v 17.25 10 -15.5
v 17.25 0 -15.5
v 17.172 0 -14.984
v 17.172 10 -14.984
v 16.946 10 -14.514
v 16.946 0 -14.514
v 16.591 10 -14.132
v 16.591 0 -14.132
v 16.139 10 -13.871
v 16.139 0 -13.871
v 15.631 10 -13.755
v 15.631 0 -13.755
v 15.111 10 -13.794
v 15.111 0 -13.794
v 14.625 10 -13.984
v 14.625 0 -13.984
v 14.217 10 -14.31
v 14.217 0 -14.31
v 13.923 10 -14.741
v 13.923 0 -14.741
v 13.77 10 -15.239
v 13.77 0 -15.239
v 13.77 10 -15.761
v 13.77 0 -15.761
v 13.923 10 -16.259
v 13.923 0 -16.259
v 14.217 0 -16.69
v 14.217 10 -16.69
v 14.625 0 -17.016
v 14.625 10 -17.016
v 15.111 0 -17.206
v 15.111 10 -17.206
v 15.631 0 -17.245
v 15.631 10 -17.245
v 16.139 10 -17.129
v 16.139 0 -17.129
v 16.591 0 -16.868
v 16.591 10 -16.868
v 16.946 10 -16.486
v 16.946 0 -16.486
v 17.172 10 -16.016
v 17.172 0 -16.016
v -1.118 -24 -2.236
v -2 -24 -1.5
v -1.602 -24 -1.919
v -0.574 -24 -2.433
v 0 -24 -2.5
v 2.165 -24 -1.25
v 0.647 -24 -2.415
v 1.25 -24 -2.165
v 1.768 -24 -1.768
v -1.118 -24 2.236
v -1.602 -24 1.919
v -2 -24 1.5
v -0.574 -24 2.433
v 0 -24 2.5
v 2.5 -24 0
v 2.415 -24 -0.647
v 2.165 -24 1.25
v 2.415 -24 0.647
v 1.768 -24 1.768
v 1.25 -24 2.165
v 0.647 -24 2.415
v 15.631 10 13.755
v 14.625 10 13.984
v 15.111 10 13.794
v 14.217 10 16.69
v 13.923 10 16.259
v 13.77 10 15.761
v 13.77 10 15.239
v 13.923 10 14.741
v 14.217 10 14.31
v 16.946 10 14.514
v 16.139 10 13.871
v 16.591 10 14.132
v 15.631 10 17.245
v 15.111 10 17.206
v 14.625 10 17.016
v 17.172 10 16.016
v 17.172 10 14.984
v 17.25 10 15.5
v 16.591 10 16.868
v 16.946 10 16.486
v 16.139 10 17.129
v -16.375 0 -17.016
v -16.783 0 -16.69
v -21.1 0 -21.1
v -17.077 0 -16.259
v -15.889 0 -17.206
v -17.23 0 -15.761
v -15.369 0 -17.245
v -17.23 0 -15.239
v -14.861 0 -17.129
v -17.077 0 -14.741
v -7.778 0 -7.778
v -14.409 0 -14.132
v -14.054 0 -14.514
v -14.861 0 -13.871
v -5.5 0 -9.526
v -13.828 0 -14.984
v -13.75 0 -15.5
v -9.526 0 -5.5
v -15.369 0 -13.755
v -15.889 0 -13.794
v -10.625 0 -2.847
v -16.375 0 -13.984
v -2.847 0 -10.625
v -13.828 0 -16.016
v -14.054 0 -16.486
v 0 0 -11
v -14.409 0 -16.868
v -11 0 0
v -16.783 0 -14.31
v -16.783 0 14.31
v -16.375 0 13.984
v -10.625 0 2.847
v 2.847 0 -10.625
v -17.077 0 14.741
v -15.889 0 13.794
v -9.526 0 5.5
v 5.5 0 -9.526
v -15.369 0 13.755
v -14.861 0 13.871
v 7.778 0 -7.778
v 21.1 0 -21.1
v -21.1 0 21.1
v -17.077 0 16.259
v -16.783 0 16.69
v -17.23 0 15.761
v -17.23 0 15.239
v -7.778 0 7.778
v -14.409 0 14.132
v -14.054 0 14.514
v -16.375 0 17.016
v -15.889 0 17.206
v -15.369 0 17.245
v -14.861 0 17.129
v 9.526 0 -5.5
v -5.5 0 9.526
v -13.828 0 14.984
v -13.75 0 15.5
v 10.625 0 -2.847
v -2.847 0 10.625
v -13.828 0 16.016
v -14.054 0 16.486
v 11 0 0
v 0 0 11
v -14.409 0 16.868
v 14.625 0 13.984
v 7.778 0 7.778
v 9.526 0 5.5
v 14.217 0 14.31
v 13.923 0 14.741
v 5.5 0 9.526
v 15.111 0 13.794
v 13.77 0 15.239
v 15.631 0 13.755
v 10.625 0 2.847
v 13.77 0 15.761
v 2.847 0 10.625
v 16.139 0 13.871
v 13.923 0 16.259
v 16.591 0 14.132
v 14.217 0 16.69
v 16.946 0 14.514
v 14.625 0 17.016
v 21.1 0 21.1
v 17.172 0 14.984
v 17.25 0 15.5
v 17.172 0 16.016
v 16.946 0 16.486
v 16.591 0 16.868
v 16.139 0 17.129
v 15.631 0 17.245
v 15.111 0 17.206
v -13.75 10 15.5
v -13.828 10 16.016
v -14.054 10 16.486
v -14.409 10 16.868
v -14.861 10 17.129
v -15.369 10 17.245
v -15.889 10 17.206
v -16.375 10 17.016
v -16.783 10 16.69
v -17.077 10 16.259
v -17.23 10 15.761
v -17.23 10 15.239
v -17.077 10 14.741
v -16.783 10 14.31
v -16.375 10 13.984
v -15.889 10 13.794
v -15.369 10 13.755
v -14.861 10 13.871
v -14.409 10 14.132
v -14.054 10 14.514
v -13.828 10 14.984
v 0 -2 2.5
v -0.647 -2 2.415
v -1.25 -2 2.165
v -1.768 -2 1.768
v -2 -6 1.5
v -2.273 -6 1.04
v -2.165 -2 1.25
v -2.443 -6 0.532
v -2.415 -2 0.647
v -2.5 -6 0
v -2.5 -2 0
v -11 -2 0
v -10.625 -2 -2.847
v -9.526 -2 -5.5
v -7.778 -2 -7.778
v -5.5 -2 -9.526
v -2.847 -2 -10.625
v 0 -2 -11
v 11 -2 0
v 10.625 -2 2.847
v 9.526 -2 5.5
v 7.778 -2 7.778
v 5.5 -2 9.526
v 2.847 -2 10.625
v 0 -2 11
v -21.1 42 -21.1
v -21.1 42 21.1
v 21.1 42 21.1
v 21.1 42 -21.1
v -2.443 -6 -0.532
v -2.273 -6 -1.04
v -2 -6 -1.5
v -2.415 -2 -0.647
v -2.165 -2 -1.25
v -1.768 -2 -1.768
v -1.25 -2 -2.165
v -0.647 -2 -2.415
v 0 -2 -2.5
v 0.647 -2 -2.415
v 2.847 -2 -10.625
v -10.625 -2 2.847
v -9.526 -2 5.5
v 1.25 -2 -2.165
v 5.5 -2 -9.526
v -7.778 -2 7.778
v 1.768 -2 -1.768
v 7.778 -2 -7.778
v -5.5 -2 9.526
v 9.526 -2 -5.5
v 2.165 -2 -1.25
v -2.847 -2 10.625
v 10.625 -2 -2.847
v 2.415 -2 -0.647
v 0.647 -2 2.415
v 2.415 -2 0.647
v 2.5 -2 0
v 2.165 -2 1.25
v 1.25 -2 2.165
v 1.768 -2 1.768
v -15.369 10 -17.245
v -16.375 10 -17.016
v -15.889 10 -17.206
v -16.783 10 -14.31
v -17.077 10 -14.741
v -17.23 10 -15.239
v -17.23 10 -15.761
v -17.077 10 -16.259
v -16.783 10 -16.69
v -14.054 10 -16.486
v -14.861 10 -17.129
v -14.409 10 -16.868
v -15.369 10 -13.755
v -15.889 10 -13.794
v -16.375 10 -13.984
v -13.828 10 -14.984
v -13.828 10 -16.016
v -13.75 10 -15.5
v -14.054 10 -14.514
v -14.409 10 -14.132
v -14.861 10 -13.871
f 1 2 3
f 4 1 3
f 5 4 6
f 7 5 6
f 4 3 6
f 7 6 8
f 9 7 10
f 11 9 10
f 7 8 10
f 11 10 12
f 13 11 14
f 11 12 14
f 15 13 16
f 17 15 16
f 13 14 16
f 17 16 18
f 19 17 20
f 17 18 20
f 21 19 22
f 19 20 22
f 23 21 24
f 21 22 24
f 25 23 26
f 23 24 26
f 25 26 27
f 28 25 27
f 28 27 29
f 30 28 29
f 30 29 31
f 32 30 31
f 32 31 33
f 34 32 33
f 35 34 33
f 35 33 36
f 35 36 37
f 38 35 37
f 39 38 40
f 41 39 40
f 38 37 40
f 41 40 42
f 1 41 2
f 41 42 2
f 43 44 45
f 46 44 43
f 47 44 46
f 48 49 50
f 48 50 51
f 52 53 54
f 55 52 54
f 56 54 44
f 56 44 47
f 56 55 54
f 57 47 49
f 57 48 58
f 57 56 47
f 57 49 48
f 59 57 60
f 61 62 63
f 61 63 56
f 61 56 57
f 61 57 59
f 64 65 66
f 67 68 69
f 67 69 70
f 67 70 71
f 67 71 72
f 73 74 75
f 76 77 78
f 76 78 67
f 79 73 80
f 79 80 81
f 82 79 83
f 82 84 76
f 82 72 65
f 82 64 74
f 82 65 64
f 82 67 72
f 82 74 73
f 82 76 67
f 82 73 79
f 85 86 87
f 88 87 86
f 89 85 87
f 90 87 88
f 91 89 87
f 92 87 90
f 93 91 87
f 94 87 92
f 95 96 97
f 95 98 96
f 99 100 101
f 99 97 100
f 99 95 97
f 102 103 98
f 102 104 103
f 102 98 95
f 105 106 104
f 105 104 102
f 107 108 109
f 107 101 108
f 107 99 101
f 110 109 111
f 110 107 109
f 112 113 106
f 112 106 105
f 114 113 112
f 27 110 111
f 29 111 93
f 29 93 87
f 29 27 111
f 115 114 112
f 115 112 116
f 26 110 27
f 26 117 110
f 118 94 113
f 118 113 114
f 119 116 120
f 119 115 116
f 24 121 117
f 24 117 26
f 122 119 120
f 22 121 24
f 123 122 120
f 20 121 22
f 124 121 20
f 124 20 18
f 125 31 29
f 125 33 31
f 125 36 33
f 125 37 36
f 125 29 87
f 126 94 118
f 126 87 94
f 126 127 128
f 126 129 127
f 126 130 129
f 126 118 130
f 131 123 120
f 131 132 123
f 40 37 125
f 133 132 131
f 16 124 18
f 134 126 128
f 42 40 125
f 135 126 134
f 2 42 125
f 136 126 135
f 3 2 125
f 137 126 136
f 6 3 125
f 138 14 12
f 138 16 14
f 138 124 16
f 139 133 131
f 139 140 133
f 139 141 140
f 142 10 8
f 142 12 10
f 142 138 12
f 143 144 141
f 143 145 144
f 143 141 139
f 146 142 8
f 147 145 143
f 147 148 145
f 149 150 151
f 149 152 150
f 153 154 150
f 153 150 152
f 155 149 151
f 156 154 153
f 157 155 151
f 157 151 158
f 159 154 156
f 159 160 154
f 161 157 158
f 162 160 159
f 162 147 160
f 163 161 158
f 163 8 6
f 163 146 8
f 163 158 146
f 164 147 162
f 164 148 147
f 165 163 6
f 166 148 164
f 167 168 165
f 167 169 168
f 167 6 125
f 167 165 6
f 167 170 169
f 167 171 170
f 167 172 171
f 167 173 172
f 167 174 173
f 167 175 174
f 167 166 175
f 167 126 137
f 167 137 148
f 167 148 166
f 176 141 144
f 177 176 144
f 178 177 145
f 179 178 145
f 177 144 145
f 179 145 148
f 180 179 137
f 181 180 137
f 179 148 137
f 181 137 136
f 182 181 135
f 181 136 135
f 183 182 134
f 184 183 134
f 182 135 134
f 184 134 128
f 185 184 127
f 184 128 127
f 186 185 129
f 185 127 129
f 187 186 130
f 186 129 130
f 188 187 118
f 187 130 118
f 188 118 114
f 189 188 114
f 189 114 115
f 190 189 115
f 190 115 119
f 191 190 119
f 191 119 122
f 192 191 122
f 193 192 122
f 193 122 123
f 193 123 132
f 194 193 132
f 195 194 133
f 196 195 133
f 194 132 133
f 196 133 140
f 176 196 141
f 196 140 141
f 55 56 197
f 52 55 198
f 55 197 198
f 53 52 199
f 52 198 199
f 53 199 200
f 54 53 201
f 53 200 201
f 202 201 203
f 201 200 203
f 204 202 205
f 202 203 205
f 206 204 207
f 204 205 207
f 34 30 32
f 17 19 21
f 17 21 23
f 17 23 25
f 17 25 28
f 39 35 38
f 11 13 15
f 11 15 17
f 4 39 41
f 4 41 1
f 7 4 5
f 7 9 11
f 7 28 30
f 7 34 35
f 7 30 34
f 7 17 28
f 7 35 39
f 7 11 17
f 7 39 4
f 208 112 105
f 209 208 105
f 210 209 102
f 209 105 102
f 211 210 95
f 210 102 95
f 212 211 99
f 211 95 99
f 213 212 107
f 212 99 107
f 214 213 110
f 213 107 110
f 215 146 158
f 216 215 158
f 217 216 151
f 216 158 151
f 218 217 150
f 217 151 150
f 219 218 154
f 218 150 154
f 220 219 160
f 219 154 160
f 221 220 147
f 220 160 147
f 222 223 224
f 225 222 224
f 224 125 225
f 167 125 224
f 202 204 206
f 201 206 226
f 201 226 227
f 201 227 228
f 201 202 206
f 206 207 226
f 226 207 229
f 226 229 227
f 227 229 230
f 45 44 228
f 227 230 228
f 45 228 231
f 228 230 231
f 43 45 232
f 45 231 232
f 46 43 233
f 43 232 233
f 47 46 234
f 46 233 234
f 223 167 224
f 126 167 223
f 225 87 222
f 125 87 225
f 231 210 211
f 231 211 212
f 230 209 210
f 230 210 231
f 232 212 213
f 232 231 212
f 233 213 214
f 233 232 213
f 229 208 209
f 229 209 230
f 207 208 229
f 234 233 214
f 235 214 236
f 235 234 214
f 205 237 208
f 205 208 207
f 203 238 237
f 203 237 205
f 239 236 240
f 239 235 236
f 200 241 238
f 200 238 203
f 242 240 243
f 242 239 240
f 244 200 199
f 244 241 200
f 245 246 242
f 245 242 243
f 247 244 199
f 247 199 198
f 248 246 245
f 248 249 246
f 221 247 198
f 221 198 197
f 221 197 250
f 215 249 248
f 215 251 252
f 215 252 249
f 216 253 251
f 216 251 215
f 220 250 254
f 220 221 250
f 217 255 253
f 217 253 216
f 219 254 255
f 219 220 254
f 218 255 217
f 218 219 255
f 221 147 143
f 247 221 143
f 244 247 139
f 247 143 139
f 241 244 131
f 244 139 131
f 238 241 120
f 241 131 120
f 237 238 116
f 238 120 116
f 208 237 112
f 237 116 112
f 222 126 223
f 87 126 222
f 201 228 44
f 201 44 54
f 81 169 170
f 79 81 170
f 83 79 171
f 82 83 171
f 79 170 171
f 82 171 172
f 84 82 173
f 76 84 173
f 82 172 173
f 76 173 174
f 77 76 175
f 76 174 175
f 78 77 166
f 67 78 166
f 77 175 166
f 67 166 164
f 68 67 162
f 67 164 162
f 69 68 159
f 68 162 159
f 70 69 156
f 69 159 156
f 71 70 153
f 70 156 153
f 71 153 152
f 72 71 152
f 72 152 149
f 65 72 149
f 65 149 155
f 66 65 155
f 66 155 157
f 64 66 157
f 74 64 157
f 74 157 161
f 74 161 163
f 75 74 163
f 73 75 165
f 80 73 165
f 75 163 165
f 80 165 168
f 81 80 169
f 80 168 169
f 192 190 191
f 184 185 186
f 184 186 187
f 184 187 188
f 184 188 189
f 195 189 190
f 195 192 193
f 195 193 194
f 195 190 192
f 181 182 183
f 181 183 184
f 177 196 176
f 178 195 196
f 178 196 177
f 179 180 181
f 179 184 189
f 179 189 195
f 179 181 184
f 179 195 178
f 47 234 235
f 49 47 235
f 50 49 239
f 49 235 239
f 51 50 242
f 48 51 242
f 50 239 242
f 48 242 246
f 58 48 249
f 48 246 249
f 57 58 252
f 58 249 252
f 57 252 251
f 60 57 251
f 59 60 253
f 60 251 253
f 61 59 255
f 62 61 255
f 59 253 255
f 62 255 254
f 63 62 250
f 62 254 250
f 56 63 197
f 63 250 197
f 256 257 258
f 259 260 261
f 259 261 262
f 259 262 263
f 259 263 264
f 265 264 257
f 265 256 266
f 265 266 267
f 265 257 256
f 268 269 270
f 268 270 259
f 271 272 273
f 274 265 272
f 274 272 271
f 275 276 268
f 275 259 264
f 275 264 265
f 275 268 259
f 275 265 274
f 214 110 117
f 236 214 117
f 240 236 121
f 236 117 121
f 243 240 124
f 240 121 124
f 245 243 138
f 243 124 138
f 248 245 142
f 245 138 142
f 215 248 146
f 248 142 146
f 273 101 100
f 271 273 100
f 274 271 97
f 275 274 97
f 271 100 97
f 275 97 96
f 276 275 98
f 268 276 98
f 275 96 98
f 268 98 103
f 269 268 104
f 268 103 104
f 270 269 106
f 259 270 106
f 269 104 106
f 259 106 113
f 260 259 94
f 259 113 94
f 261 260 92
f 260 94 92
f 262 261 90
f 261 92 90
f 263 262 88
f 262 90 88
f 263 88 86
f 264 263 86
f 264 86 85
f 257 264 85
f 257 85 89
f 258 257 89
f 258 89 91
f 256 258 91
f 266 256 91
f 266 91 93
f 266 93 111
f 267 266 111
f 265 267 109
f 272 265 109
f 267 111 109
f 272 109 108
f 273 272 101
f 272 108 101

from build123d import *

# Parameters (mm, degrees)
F0_R     = 1.75
F1_DEPTH = 42
F2_DEPTH = 2
F3_DEPTH = 24
F4_DEPTH = 10
F6_DEPTH = 18


with BuildPart() as f1:
    # F0 (on Front) → F1 (new body)
    with BuildSketch(Plane.XZ):
        Polygon((21.1, 21.1), (0, 21.1), (-21.1, 21.1), (-21.1, 0), (-21.1, -21.1), (0, -21.1), (21.1, -21.1), (21.1, 0), align=None)
        with Locations((-15.5, -15.5)):
            Circle(F0_R, mode=Mode.SUBTRACT)
        with Locations((15.5, -15.5)):
            Circle(F0_R, mode=Mode.SUBTRACT)
        with Locations((-15.5, 15.5)):
            Circle(F0_R, mode=Mode.SUBTRACT)
        with BuildLine():
            ThreePointArc((0, 11), (7.778175, 7.778175), (11, 0))
            ThreePointArc((11, 0), (7.778175, -7.778175), (0, -11))
            ThreePointArc((0, -11), (-7.778175, -7.778175), (-11, 0))
            ThreePointArc((-11, 0), (-7.778175, 7.778175), (0, 11))
        make_face(mode=Mode.SUBTRACT)
        with Locations((15.5, 15.5)):
            Circle(F0_R, mode=Mode.SUBTRACT)
        with BuildLine():
            ThreePointArc((0, -11), (7.778175, -7.778175), (11, 0))
            ThreePointArc((11, 0), (7.778175, 7.778175), (0, 11))
            ThreePointArc((0, 11), (-7.778175, 7.778175), (-11, 0))
            ThreePointArc((-11, 0), (-7.778175, -7.778175), (0, -11))
        make_face()
        with BuildLine():
            ThreePointArc((0, 2.5), (1.767767, 1.767767), (2.5, 0))
            ThreePointArc((2.5, 0), (1.767767, -1.767767), (0, -2.5))
            ThreePointArc((0, -2.5), (-1.767767, -1.767767), (-2.5, 0))
            ThreePointArc((-2.5, 0), (-1.767767, 1.767767), (0, 2.5))
        make_face(mode=Mode.SUBTRACT)
        with BuildLine():
            ThreePointArc((0, -2.5), (1.767767, -1.767767), (2.5, 0))
            ThreePointArc((2.5, 0), (1.767767, 1.767767), (0, 2.5))
            ThreePointArc((0, 2.5), (-1.767767, 1.767767), (-2.5, 0))
            ThreePointArc((-2.5, 0), (-1.767767, -1.767767), (0, -2.5))
        make_face()
        with Locations((15.5, 15.5)):
            Circle(F0_R)
        with Locations((-15.5, 15.5)):
            Circle(F0_R)
        with Locations((-15.5, -15.5)):
            Circle(F0_R)
        with Locations((15.5, -15.5)):
            Circle(F0_R)
    extrude(amount=-F1_DEPTH)

    # F0 (on Front) → F2 (join)
    with BuildSketch(Plane.XZ):
        with BuildLine():
            ThreePointArc((0, -11), (7.778175, -7.778175), (11, 0))
            ThreePointArc((11, 0), (7.778175, 7.778175), (0, 11))
            ThreePointArc((0, 11), (-7.778175, 7.778175), (-11, 0))
            ThreePointArc((-11, 0), (-7.778175, -7.778175), (0, -11))
        make_face()
        with BuildLine():
            ThreePointArc((0, 2.5), (1.767767, 1.767767), (2.5, 0))
            ThreePointArc((2.5, 0), (1.767767, -1.767767), (0, -2.5))
            ThreePointArc((0, -2.5), (-1.767767, -1.767767), (-2.5, 0))
            ThreePointArc((-2.5, 0), (-1.767767, 1.767767), (0, 2.5))
        make_face(mode=Mode.SUBTRACT)
    extrude(amount=F2_DEPTH)

    # F0 (on Front) → F3 (join)
    with BuildSketch(Plane.XZ):
        with BuildLine():
            ThreePointArc((0, -2.5), (1.767767, -1.767767), (2.5, 0))
            ThreePointArc((2.5, 0), (1.767767, 1.767767), (0, 2.5))
            ThreePointArc((0, 2.5), (-1.767767, 1.767767), (-2.5, 0))
            ThreePointArc((-2.5, 0), (-1.767767, -1.767767), (0, -2.5))
        make_face()
    extrude(amount=F3_DEPTH)

    # F0 (on Front) → F4 (cut)
    with BuildSketch(Plane.XZ):
        with Locations((-15.5, 15.5)):
            Circle(F0_R)
        with Locations((15.5, -15.5)):
            Circle(F0_R)
        with Locations((-15.5, -15.5)):
            Circle(F0_R)
        with Locations((15.5, 15.5)):
            Circle(F0_R)
    extrude(amount=-F4_DEPTH, mode=Mode.SUBTRACT)

    # F5 (on face) → F6 (cut)
    with BuildSketch(Plane.XZ.offset(24)):
        with BuildLine():
            Line((-2, 0), (-2, 1.5))
            ThreePointArc((-2, 1.5), (-2.5, 0), (-2, -1.5))
            Line((-2, -1.5), (-2, 0))
        make_face()
    extrude(amount=-F6_DEPTH, mode=Mode.SUBTRACT)


solid = f1.part
